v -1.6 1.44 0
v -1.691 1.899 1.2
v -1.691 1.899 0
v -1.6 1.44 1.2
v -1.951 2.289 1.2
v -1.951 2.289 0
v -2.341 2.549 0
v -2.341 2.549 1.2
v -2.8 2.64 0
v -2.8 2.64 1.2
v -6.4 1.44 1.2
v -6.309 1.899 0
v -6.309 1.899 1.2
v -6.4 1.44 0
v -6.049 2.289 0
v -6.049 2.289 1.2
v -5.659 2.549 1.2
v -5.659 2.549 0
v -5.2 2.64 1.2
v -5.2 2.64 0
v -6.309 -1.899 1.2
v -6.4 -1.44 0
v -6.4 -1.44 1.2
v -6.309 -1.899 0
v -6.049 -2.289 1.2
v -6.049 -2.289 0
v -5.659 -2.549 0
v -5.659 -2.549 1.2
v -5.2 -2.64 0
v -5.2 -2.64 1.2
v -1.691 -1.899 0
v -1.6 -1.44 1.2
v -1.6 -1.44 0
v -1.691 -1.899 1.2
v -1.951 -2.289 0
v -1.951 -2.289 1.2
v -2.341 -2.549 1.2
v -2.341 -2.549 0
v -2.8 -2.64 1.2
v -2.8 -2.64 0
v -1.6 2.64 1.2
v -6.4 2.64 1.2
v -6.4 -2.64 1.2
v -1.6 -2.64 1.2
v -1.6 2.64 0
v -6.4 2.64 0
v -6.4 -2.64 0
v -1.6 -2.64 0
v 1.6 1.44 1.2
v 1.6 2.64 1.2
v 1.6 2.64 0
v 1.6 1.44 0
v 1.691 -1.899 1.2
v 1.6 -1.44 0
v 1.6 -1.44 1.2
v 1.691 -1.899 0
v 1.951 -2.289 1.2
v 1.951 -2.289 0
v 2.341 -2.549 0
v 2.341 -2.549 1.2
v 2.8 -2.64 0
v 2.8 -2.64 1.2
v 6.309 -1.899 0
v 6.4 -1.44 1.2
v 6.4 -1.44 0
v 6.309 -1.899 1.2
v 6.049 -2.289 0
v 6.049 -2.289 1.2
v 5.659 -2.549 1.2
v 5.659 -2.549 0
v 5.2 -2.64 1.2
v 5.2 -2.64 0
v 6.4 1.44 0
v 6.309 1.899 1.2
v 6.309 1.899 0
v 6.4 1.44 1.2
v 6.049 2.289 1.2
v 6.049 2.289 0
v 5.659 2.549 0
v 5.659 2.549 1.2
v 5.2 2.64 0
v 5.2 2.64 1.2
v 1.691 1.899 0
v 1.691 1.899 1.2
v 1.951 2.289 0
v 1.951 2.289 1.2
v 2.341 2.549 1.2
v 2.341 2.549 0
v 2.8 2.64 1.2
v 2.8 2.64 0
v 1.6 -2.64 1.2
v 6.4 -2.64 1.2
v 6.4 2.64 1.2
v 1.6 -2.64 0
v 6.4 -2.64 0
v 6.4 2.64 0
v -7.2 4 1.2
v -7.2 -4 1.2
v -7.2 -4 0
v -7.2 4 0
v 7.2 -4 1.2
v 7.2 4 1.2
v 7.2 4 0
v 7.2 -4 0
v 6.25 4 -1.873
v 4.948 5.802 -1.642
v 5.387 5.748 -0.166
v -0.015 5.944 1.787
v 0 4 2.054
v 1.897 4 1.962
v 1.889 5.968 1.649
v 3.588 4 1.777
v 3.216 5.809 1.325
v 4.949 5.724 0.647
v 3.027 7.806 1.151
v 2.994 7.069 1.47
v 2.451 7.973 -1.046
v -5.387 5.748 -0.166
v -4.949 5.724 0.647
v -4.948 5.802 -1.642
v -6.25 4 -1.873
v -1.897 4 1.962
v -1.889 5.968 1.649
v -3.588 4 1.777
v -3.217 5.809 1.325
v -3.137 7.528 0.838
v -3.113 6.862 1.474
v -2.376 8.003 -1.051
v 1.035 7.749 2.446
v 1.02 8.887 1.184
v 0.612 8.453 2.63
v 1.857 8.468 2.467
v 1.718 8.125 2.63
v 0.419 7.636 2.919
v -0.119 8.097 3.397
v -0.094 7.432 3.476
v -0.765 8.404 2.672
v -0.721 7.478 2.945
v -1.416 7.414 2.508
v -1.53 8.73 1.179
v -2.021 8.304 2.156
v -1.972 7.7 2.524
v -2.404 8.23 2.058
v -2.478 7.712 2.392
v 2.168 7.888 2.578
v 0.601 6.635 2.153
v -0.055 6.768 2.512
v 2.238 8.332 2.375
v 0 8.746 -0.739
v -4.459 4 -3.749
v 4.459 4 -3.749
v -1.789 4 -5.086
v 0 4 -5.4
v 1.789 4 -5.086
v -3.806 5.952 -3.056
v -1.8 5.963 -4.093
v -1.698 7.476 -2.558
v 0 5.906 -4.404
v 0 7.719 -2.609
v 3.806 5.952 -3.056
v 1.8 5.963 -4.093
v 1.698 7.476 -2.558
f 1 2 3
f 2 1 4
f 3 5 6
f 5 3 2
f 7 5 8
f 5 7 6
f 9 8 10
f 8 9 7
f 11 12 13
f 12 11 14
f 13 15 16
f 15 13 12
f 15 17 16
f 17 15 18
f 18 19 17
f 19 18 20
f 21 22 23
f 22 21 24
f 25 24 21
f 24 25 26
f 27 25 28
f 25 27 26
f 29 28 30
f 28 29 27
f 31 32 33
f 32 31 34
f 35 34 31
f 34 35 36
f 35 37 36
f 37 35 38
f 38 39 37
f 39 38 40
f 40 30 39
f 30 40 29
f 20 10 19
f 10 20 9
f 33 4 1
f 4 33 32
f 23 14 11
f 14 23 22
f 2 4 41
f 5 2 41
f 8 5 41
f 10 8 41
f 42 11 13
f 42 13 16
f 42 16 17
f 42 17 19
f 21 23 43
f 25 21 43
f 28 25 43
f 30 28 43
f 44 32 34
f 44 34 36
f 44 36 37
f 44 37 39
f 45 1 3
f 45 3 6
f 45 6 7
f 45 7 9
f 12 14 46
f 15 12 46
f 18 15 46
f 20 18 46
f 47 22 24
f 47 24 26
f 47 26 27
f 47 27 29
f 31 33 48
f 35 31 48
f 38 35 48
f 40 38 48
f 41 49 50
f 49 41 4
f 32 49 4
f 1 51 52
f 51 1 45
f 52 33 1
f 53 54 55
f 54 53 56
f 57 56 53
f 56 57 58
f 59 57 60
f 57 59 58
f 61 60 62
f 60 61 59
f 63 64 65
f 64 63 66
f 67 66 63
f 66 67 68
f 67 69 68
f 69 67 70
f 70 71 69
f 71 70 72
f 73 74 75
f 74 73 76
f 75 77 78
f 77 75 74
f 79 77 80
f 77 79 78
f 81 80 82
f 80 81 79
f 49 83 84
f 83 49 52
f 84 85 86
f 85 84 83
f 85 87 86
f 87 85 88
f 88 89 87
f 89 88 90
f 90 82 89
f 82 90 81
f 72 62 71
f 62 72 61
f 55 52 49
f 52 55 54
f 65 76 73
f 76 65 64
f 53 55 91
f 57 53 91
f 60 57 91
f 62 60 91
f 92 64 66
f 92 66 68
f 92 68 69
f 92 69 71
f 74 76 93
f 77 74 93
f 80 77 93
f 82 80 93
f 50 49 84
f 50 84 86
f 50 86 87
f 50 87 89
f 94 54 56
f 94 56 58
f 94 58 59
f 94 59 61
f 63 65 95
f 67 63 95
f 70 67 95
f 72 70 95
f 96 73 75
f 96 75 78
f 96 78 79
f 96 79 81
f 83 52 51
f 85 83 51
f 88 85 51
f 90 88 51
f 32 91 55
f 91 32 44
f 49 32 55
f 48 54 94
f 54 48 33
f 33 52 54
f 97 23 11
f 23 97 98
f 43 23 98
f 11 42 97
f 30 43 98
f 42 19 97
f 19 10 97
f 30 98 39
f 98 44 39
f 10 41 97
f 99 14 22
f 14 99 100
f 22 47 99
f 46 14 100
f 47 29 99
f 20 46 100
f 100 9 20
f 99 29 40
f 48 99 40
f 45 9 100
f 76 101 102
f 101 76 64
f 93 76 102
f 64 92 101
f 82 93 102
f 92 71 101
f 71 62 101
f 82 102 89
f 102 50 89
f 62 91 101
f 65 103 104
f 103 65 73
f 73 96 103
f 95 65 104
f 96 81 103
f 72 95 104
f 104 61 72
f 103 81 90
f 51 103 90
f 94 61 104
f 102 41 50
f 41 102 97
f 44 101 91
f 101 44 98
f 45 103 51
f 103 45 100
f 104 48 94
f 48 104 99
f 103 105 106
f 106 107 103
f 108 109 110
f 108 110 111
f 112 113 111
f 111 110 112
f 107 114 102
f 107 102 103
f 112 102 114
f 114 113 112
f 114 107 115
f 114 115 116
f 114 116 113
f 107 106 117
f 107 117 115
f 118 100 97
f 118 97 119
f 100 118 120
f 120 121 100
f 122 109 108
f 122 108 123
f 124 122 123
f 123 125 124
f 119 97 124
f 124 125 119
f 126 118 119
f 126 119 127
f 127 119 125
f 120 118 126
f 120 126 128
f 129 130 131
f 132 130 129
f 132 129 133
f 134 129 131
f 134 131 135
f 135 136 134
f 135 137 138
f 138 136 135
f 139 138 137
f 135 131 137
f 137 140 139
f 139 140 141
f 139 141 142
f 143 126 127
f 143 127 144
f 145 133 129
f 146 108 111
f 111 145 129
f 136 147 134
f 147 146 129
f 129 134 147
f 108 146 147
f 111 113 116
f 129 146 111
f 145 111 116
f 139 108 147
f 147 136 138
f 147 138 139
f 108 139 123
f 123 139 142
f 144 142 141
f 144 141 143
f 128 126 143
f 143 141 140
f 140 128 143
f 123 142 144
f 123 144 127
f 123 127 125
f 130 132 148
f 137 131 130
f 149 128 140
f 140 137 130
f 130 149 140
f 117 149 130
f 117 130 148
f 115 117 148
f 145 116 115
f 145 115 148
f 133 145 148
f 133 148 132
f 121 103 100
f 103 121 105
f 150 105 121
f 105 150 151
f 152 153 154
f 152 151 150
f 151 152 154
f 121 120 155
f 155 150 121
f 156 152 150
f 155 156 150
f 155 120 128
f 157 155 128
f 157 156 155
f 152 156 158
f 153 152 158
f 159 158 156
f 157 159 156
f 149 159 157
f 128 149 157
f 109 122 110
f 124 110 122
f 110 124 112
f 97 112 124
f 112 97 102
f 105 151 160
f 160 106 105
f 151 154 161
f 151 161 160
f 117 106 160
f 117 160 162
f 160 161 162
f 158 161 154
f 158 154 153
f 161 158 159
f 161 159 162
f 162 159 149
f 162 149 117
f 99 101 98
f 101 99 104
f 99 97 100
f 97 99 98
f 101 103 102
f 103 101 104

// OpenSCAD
// file: ../p/1-4edge.scad
use <../lib.scad>
function ldraw_lib__1_4edge() = [
// 0 Circle 0.25
// 0 Name: 1-4edge.dat
// 0 Author: James Jessiman
// 0 !LDRAW_ORG Primitive UPDATE 2017-01
// 0 !LICENSE Licensed under CC BY 4.0 : see CAreadme.txt
// 
// 0 BFC CERTIFY CCW
  [0,"BFC","CERTIFY"],
  [0,"BFC","CCW"],
// 
// 0 !HISTORY 2007-06-22 [PTadmin] Header formatted for Contributor Agreement
// 0 !HISTORY 2008-07-01 [PTadmin] Official Update 2008-01
// 0 !HISTORY 2017-01-15 [Steffen] BFCed
// 0 !HISTORY 2017-12-30 [PTadmin] Official Update 2017-01
// 
// 
// 2 24 1 0 0 0.9239 0 0.3827
  [2,24,1,0,0,0.9239,0,0.3827],
// 2 24 0.9239 0 0.3827 0.7071 0 0.7071
  [2,24,0.9239,0,0.3827,0.7071,0,0.7071],
// 2 24 0.7071 0 0.7071 0.3827 0 0.9239
  [2,24,0.7071,0,0.7071,0.3827,0,0.9239],
// 2 24 0.3827 0 0.9239 0 0 1
  [2,24,0.3827,0,0.9239,0,0,1],
];
module ldraw_lib__1_4edge(step=0, col=false, unit=2/5, alt=false, line=0.2, solid=!$preview)
    makepoly(ldraw_lib__1_4edge(), step=step, col=col, unit=unit, alt=alt, line=line, solid=solid);
ldraw_lib__1_4edge(line=0.2);
// file: ../p/1-4cyli.scad
use <../lib.scad>
function ldraw_lib__1_4cyli() = [
// 0 Cylinder 0.25
// 0 Name: 1-4cyli.dat
// 0 Author: James Jessiman
// 0 !LDRAW_ORG Primitive UPDATE 2012-01
// 0 !LICENSE Licensed under CC BY 4.0 : see CAreadme.txt
// 
// 0 BFC CERTIFY CCW
  [0,"BFC","CERTIFY"],
  [0,"BFC","CCW"],
// 
// 0 !HISTORY 2002-03-23 [sbliss] Added BFC statement.
// 0 !HISTORY 2002-04-25 [PTadmin] Official Update 2002-02
// 0 !HISTORY 2007-06-22 [PTadmin] Header formatted for Contributor Agreement
// 0 !HISTORY 2008-07-01 [PTadmin] Official Update 2008-01
// 0 !HISTORY 2012-02-16 [Philo] Changed to CCW
// 0 !HISTORY 2012-03-30 [PTadmin] Official Update 2012-01
// 
// 
// 4 16 1 1 0 0.9239 1 0.3827 0.9239 0 0.3827 1 0 0
  [4,16,1,1,0,0.9239,1,0.3827,0.9239,0,0.3827,1,0,0],
// 5 24 1 0 0 1 1 0 0.9239 0 0.3827 1 0 -1
  [5,24,1,0,0,1,1,0,0.9239,0,0.3827,1,0,-1],
// 4 16 0.9239 1 0.3827 0.7071 1 0.7071 0.7071 0 0.7071 0.9239 0 0.3827
  [4,16,0.9239,1,0.3827,0.7071,1,0.7071,0.7071,0,0.7071,0.9239,0,0.3827],
// 5 24 0.9239 0 0.3827 0.9239 1 0.3827 0.7071 0 0.7071 1 0 0
  [5,24,0.9239,0,0.3827,0.9239,1,0.3827,0.7071,0,0.7071,1,0,0],
// 4 16 0.7071 1 0.7071 0.3827 1 0.9239 0.3827 0 0.9239 0.7071 0 0.7071
  [4,16,0.7071,1,0.7071,0.3827,1,0.9239,0.3827,0,0.9239,0.7071,0,0.7071],
// 5 24 0.7071 0 0.7071 0.7071 1 0.7071 0.3827 0 0.9239 0.9239 0 0.3827
  [5,24,0.7071,0,0.7071,0.7071,1,0.7071,0.3827,0,0.9239,0.9239,0,0.3827],
// 4 16 0.3827 1 0.9239 0 1 1 0 0 1 0.3827 0 0.9239
  [4,16,0.3827,1,0.9239,0,1,1,0,0,1,0.3827,0,0.9239],
// 5 24 0.3827 0 0.9239 0.3827 1 0.9239 0 0 1 0.7071 0 0.7071
  [5,24,0.3827,0,0.9239,0.3827,1,0.9239,0,0,1,0.7071,0,0.7071],
// 5 24 0 0 1 0 1 1 0.3827 0 0.9239 -1 0 1
  [5,24,0,0,1,0,1,1,0.3827,0,0.9239,-1,0,1],
];
module ldraw_lib__1_4cyli(step=0, col=false, unit=2/5, alt=false, line=0.2, solid=!$preview)
    makepoly(ldraw_lib__1_4cyli(), step=step, col=col, unit=unit, alt=alt, line=line, solid=solid);
ldraw_lib__1_4cyli(line=0.2);
// file: ../p/rect2p.scad
use <../lib.scad>
function ldraw_lib__rect2p() = [
// 0 Rectangle with 2 Parallel Edges
// 0 Name: rect2p.dat
// 0 Author: Donald Sutter [technog]
// 0 !LDRAW_ORG Primitive UPDATE 2010-01
// 0 !LICENSE Licensed under CC BY 4.0 : see CAreadme.txt
// 
// 0 BFC CERTIFY CCW
  [0,"BFC","CERTIFY"],
  [0,"BFC","CCW"],
// 
// 0 !HISTORY 2003-08-01 [PTadmin] Official Update 2003-02
// 0 !HISTORY 2007-06-24 [PTadmin] Header formatted for Contributor Agreement
// 0 !HISTORY 2008-07-01 [PTadmin] Official Update 2008-01
// 0 !HISTORY 2010-01-17 [mikeheide] changed winding to CCW
// 0 !HISTORY 2010-04-05 [PTadmin] Official Update 2010-01
// 
// 
// 2 24 1 0 1 -1 0 1
  [2,24,1,0,1,-1,0,1],
// 2 24 -1 0 -1 1 0 -1
  [2,24,-1,0,-1,1,0,-1],
// 4 16 -1 0 1 -1 0 -1 1 0 -1 1 0 1
  [4,16,-1,0,1,-1,0,-1,1,0,-1,1,0,1],
// 0
];
module ldraw_lib__rect2p(step=0, col=false, unit=2/5, alt=false, line=0.2, solid=!$preview)
    makepoly(ldraw_lib__rect2p(), step=step, col=col, unit=unit, alt=alt, line=line, solid=solid);
ldraw_lib__rect2p(line=0.2);
// file: ../p/1-4ndis.scad
use <../lib.scad>
function ldraw_lib__1_4ndis() = [
// 0 Disc Negative 0.25
// 0 Name: 1-4ndis.dat
// 0 Author: James Jessiman
// 0 !LDRAW_ORG Primitive UPDATE 2012-01
// 0 !LICENSE Licensed under CC BY 4.0 : see CAreadme.txt
// 
// 0 BFC CERTIFY CCW
  [0,"BFC","CERTIFY"],
  [0,"BFC","CCW"],
// 
// 0 !HISTORY 2002-03-23 [sbliss] Added BFC Statement
// 0 !HISTORY 2002-04-25 [PTadmin] Official Update 2002-02
// 0 !HISTORY 2007-06-22 [PTadmin] Header formatted for Contributor Agreement
// 0 !HISTORY 2008-07-01 [PTadmin] Official Update 2008-01
// 0 !HISTORY 2012-02-16 [Philo] Changed to CCW
// 0 !HISTORY 2012-03-30 [PTadmin] Official Update 2012-01
// 
// 
// 3 16 0.9239 0 0.3827 1 0 0 1 0 1
  [3,16,0.9239,0,0.3827,1,0,0,1,0,1],
// 3 16 0.7071 0 0.7071 0.9239 0 0.3827 1 0 1
  [3,16,0.7071,0,0.7071,0.9239,0,0.3827,1,0,1],
// 3 16 0.3827 0 0.9239 0.7071 0 0.7071 1 0 1
  [3,16,0.3827,0,0.9239,0.7071,0,0.7071,1,0,1],
// 3 16 0 0 1 0.3827 0 0.9239 1 0 1
  [3,16,0,0,1,0.3827,0,0.9239,1,0,1],
];
module ldraw_lib__1_4ndis(step=0, col=false, unit=2/5, alt=false, line=0.2, solid=!$preview)
    makepoly(ldraw_lib__1_4ndis(), step=step, col=col, unit=unit, alt=alt, line=line, solid=solid);
ldraw_lib__1_4ndis(line=0.2);
// file: ../p/1-4cylo.scad
use <../lib.scad>
use <1-4cyli.scad>
use <1-4edge.scad>
function ldraw_lib__1_4cylo() = [
// 0 Cylinder Open 0.25
// 0 Name: 1-4cylo.dat
// 0 Author: Max Martin Richter [MMR1988]
// 0 !LDRAW_ORG Primitive UPDATE 2010-03
// 0 !LICENSE Licensed under CC BY 4.0 : see CAreadme.txt
// 
// 0 BFC CERTIFY CCW
  [0,"BFC","CERTIFY"],
  [0,"BFC","CCW"],
// 
// 0 !HISTORY 2010-12-31 [PTadmin] Official Update 2010-03
// 
// 
// 1 16 0 0 0 1 0 0 0 1 0 0 0 1 1-4edge.dat
  [1,16,0,0,0,1,0,0,0,1,0,0,0,1, ldraw_lib__1_4edge()],
// 1 16 0 1 0 1 0 0 0 1 0 0 0 1 1-4edge.dat
  [1,16,0,1,0,1,0,0,0,1,0,0,0,1, ldraw_lib__1_4edge()],
// 1 16 0 0 0 1 0 0 0 1 0 0 0 1 1-4cyli.dat
  [1,16,0,0,0,1,0,0,0,1,0,0,0,1, ldraw_lib__1_4cyli()],
];
module ldraw_lib__1_4cylo(step=0, col=false, unit=2/5, alt=false, line=0.2, solid=!$preview)
    makepoly(ldraw_lib__1_4cylo(), step=step, col=col, unit=unit, alt=alt, line=line, solid=solid);
ldraw_lib__1_4cylo(line=0.2);
// file: s/24779s03.scad
use <../../lib.scad>
use <../../p/1-4cylo.scad>
use <../../p/1-4ndis.scad>
use <../../p/rect2p.scad>
function ldraw_lib__s__24779s03() = [
// 0 ~Minifig Hipwear Antistud
// 0 Name: s\24779s03.dat
// 0 Author: Gerald Lasser [GeraldLasser]
// 0 !LDRAW_ORG Subpart UPDATE 2022-03
// 0 !LICENSE Licensed under CC BY 4.0 : see CAreadme.txt
// 
// 0 BFC CERTIFY CCW
  [0,"BFC","CERTIFY"],
  [0,"BFC","CCW"],
// 
// 0 !HISTORY 2022-05-07 [PTadmin] Official Update 2022-03
// 
// 
// 0 BFC INVERTNEXT
  [0,"BFC","INVERTNEXT"],
// 1 16 -7 -3 3.6 3 0 0 0 3 0 0 0 3 1-4cylo.dat
  [1,16,-7,-3,3.6,3,0,0,0,3,0,0,0,3, ldraw_lib__1_4cylo()],
// 0 BFC INVERTNEXT
  [0,"BFC","INVERTNEXT"],
// 1 16 -13 -3 3.6 -3 0 0 0 3 0 0 0 3 1-4cylo.dat
  [1,16,-13,-3,3.6,-3,0,0,0,3,0,0,0,3, ldraw_lib__1_4cylo()],
// 0 BFC INVERTNEXT
  [0,"BFC","INVERTNEXT"],
// 1 16 -13 -3 -3.6 -3 0 0 0 3 0 0 0 -3 1-4cylo.dat
  [1,16,-13,-3,-3.6,-3,0,0,0,3,0,0,0,-3, ldraw_lib__1_4cylo()],
// 0 BFC INVERTNEXT
  [0,"BFC","INVERTNEXT"],
// 1 16 -7 -3 -3.6 3 0 0 0 3 0 0 0 -3 1-4cylo.dat
  [1,16,-7,-3,-3.6,3,0,0,0,3,0,0,0,-3, ldraw_lib__1_4cylo()],
// 1 16 -10 -1.5 -6.6 3 0 0 0 0 -1.5 0 -1 0 rect2p.dat
  [1,16,-10,-1.5,-6.6,3,0,0,0,0,-1.5,0,-1,0, ldraw_lib__rect2p()],
// 1 16 -10 -1.5 6.6 3 0 0 0 0 -1.5 0 1 0 rect2p.dat
  [1,16,-10,-1.5,6.6,3,0,0,0,0,-1.5,0,1,0, ldraw_lib__rect2p()],
// 1 16 -4 -1.5 0 0 1 0 0 0 -1.5 -3.6 0 0 rect2p.dat
  [1,16,-4,-1.5,0,0,1,0,0,0,-1.5,-3.6,0,0, ldraw_lib__rect2p()],
// 1 16 -16 -1.5 0 0 -1 0 0 0 -1.5 -3.6 0 0 rect2p.dat
  [1,16,-16,-1.5,0,0,-1,0,0,0,-1.5,-3.6,0,0, ldraw_lib__rect2p()],
// 1 16 -7 -3 3.6 3 0 0 0 1 0 0 0 3 1-4ndis.dat
  [1,16,-7,-3,3.6,3,0,0,0,1,0,0,0,3, ldraw_lib__1_4ndis()],
// 1 16 -13 -3 3.6 -3 0 0 0 1 0 0 0 3 1-4ndis.dat
  [1,16,-13,-3,3.6,-3,0,0,0,1,0,0,0,3, ldraw_lib__1_4ndis()],
// 1 16 -13 -3 -3.6 -3 0 0 0 1 0 0 0 -3 1-4ndis.dat
  [1,16,-13,-3,-3.6,-3,0,0,0,1,0,0,0,-3, ldraw_lib__1_4ndis()],
// 1 16 -7 -3 -3.6 3 0 0 0 1 0 0 0 -3 1-4ndis.dat
  [1,16,-7,-3,-3.6,3,0,0,0,1,0,0,0,-3, ldraw_lib__1_4ndis()],
// 1 16 -7 0 3.6 3 0 0 0 -1 0 0 0 3 1-4ndis.dat
  [1,16,-7,0,3.6,3,0,0,0,-1,0,0,0,3, ldraw_lib__1_4ndis()],
// 1 16 -13 0 3.6 -3 0 0 0 -1 0 0 0 3 1-4ndis.dat
  [1,16,-13,0,3.6,-3,0,0,0,-1,0,0,0,3, ldraw_lib__1_4ndis()],
// 1 16 -13 0 -3.6 -3 0 0 0 -1 0 0 0 -3 1-4ndis.dat
  [1,16,-13,0,-3.6,-3,0,0,0,-1,0,0,0,-3, ldraw_lib__1_4ndis()],
// 1 16 -7 0 -3.6 3 0 0 0 -1 0 0 0 -3 1-4ndis.dat
  [1,16,-7,0,-3.6,3,0,0,0,-1,0,0,0,-3, ldraw_lib__1_4ndis()],
// 
// 4 16 4 -3 6.6 -4 -3 6.6 -4 -3 3.6 4 -3 3.6
  [4,16,4,-3,6.6,-4,-3,6.6,-4,-3,3.6,4,-3,3.6],
// 3 16 -4 -3 -3.6 4 -3 3.6 -4 -3 3.6
  [3,16,-4,-3,-3.6,4,-3,3.6,-4,-3,3.6],
// 4 16 -4 0 3.6 -4 0 6.6 4 0 6.6 4 0 3.6
  [4,16,-4,0,3.6,-4,0,6.6,4,0,6.6,4,0,3.6],
// 3 16 4 0 3.6 -4 0 -3.6 -4 0 3.6
  [3,16,4,0,3.6,-4,0,-3.6,-4,0,3.6],
];
module ldraw_lib__s__24779s03(step=0, col=false, unit=2/5, alt=false, line=0.2, solid=!$preview)
    makepoly(ldraw_lib__s__24779s03(), step=step, col=col, unit=unit, alt=alt, line=line, solid=solid);
ldraw_lib__s__24779s03(line=0.2);
// file: s/24779s02.scad
use <../../lib.scad>
use <24779s03.scad>
function ldraw_lib__s__24779s02() = [
// 0 ~Minifig Hipwear Antistuds Common Geometry without Sides
// 0 Name: s\24779s02.dat
// 0 Author: Gerald Lasser [GeraldLasser]
// 0 !LDRAW_ORG Subpart UPDATE 2022-04
// 0 !LICENSE Licensed under CC BY 4.0 : see CAreadme.txt
// 
// 0 BFC CERTIFY CCW
  [0,"BFC","CERTIFY"],
  [0,"BFC","CCW"],
// 
// 0 !HISTORY 2022-03-10 [MagFors] corrected hip width
// 0 !HISTORY 2022-07-18 [PTadmin] Official Update 2022-04
// 
// 
// 1 16 0 0 0 1 0 0 0 1 0 0 0 1 s\24779s03.dat
  [1,16,0,0,0,1,0,0,0,1,0,0,0,1, ldraw_lib__s__24779s03()],
// 1 16 0 0 0 -1 0 0 0 1 0 0 0 -1 s\24779s03.dat
  [1,16,0,0,0,-1,0,0,0,1,0,0,0,-1, ldraw_lib__s__24779s03()],
// 
// 4 16 -18 -3 10 -18 -3 -10 -16 -3 -3.6 -16 -3 3.6
  [4,16,-18,-3,10,-18,-3,-10,-16,-3,-3.6,-16,-3,3.6],
// 3 16 -16 -3 -6.6 -16 -3 -3.6 -18 -3 -10
  [3,16,-16,-3,-6.6,-16,-3,-3.6,-18,-3,-10],
// 3 16 -16 -3 3.6 -16 -3 6.6 -18 -3 10
  [3,16,-16,-3,3.6,-16,-3,6.6,-18,-3,10],
// 3 16 -13 -3 -6.6 -16 -3 -6.6 -18 -3 -10
  [3,16,-13,-3,-6.6,-16,-3,-6.6,-18,-3,-10],
// 3 16 -16 -3 6.6 -13 -3 6.6 -18 -3 10
  [3,16,-16,-3,6.6,-13,-3,6.6,-18,-3,10],
// 3 16 -13 -3 6.6 -7 -3 6.6 -18 -3 10
  [3,16,-13,-3,6.6,-7,-3,6.6,-18,-3,10],
// 3 16 -13 -3 -6.6 -18 -3 -10 -7 -3 -6.6
  [3,16,-13,-3,-6.6,-18,-3,-10,-7,-3,-6.6],
// 3 16 -18 -3 -10 -4 -3 -6.6 -7 -3 -6.6
  [3,16,-18,-3,-10,-4,-3,-6.6,-7,-3,-6.6],
// 3 16 -7 -3 6.6 -4 -3 6.6 -18 -3 10
  [3,16,-7,-3,6.6,-4,-3,6.6,-18,-3,10],
// 4 16 -16 0 -3.6 -18 0 -10 -18 0 10 -16 0 3.6
  [4,16,-16,0,-3.6,-18,0,-10,-18,0,10,-16,0,3.6],
// 3 16 -16 0 -3.6 -16 0 -6.6 -18 0 -10
  [3,16,-16,0,-3.6,-16,0,-6.6,-18,0,-10],
// 3 16 -16 0 6.6 -16 0 3.6 -18 0 10
  [3,16,-16,0,6.6,-16,0,3.6,-18,0,10],
// 3 16 -16 0 -6.6 -13 0 -6.6 -18 0 -10
  [3,16,-16,0,-6.6,-13,0,-6.6,-18,0,-10],
// 3 16 -13 0 6.6 -16 0 6.6 -18 0 10
  [3,16,-13,0,6.6,-16,0,6.6,-18,0,10],
// 3 16 -18 0 10 -7 0 6.6 -13 0 6.6
  [3,16,-18,0,10,-7,0,6.6,-13,0,6.6],
// 3 16 -18 0 -10 -13 0 -6.6 -7 0 -6.6
  [3,16,-18,0,-10,-13,0,-6.6,-7,0,-6.6],
// 3 16 -4 0 -6.6 -18 0 -10 -7 0 -6.6
  [3,16,-4,0,-6.6,-18,0,-10,-7,0,-6.6],
// 3 16 -4 0 6.6 -7 0 6.6 -18 0 10
  [3,16,-4,0,6.6,-7,0,6.6,-18,0,10],
// 
// 4 16 18 -3 -10 18 -3 10 16 -3 3.6 16 -3 -3.6
  [4,16,18,-3,-10,18,-3,10,16,-3,3.6,16,-3,-3.6],
// 3 16 16 -3 6.6 16 -3 3.6 18 -3 10
  [3,16,16,-3,6.6,16,-3,3.6,18,-3,10],
// 3 16 16 -3 -3.6 16 -3 -6.6 18 -3 -10
  [3,16,16,-3,-3.6,16,-3,-6.6,18,-3,-10],
// 3 16 13 -3 6.6 16 -3 6.6 18 -3 10
  [3,16,13,-3,6.6,16,-3,6.6,18,-3,10],
// 3 16 16 -3 -6.6 13 -3 -6.6 18 -3 -10
  [3,16,16,-3,-6.6,13,-3,-6.6,18,-3,-10],
// 3 16 13 -3 -6.6 7 -3 -6.6 18 -3 -10
  [3,16,13,-3,-6.6,7,-3,-6.6,18,-3,-10],
// 3 16 13 -3 6.6 18 -3 10 7 -3 6.6
  [3,16,13,-3,6.6,18,-3,10,7,-3,6.6],
// 3 16 18 -3 10 4 -3 6.6 7 -3 6.6
  [3,16,18,-3,10,4,-3,6.6,7,-3,6.6],
// 3 16 7 -3 -6.6 4 -3 -6.6 18 -3 -10
  [3,16,7,-3,-6.6,4,-3,-6.6,18,-3,-10],
// 4 16 16 0 3.6 18 0 10 18 0 -10 16 0 -3.6
  [4,16,16,0,3.6,18,0,10,18,0,-10,16,0,-3.6],
// 3 16 16 0 3.6 16 0 6.6 18 0 10
  [3,16,16,0,3.6,16,0,6.6,18,0,10],
// 3 16 16 0 -6.6 16 0 -3.6 18 0 -10
  [3,16,16,0,-6.6,16,0,-3.6,18,0,-10],
// 3 16 16 0 6.6 13 0 6.6 18 0 10
  [3,16,16,0,6.6,13,0,6.6,18,0,10],
// 3 16 13 0 -6.6 16 0 -6.6 18 0 -10
  [3,16,13,0,-6.6,16,0,-6.6,18,0,-10],
// 3 16 18 0 -10 7 0 -6.6 13 0 -6.6
  [3,16,18,0,-10,7,0,-6.6,13,0,-6.6],
// 3 16 18 0 10 13 0 6.6 7 0 6.6
  [3,16,18,0,10,13,0,6.6,7,0,6.6],
// 3 16 4 0 6.6 18 0 10 7 0 6.6
  [3,16,4,0,6.6,18,0,10,7,0,6.6],
// 3 16 4 0 -6.6 7 0 -6.6 18 0 -10
  [3,16,4,0,-6.6,7,0,-6.6,18,0,-10],
// 
// 4 16 4 -3 6.6 18 -3 10 -18 -3 10 -4 -3 6.6
  [4,16,4,-3,6.6,18,-3,10,-18,-3,10,-4,-3,6.6],
// 4 16 18 -3 -10 4 -3 -6.6 -4 -3 -6.6 -18 -3 -10
  [4,16,18,-3,-10,4,-3,-6.6,-4,-3,-6.6,-18,-3,-10],
// 4 16 -18 0 10 18 0 10 4 0 6.6 -4 0 6.6
  [4,16,-18,0,10,18,0,10,4,0,6.6,-4,0,6.6],
// 4 16 -4 0 -6.6 4 0 -6.6 18 0 -10 -18 0 -10
  [4,16,-4,0,-6.6,4,0,-6.6,18,0,-10,-18,0,-10],
];
module ldraw_lib__s__24779s02(step=0, col=false, unit=2/5, alt=false, line=0.2, solid=!$preview)
    makepoly(ldraw_lib__s__24779s02(), step=step, col=col, unit=unit, alt=alt, line=line, solid=solid);
ldraw_lib__s__24779s02(line=0.2);
// file: ../p/box3u2p.scad
use <../lib.scad>
function ldraw_lib__box3u2p() = [
// 0 Box with 3 Faces without 2 Parallel Edges
// 0 Name: box3u2p.dat
// 0 Author: Niels Karsdorp [nielsk]
// 0 !LDRAW_ORG Primitive UPDATE 2012-01
// 0 !LICENSE Licensed under CC BY 4.0 : see CAreadme.txt
// 
// 0 BFC CERTIFY CCW
  [0,"BFC","CERTIFY"],
  [0,"BFC","CCW"],
// 
// 0 !HISTORY 2003-03-12 [PTadmin] Official Update 2003-01
// 0 !HISTORY 2007-06-24 [PTadmin] Header formatted for Contributor Agreement
// 0 !HISTORY 2008-07-01 [PTadmin] Official Update 2008-01
// 0 !HISTORY 2012-02-16 [Philo] Changed to CCW
// 0 !HISTORY 2012-03-30 [PTadmin] Official Update 2012-01
// 
// 
// 2 24 1 1 1 -1 1 1
  [2,24,1,1,1,-1,1,1],
// 2 24 -1 1 -1 1 1 -1
  [2,24,-1,1,-1,1,1,-1],
// 2 24 1 0 1 -1 0 1
  [2,24,1,0,1,-1,0,1],
// 2 24 -1 0 -1 1 0 -1
  [2,24,-1,0,-1,1,0,-1],
// 2 24 1 1 1 1 1 -1
  [2,24,1,1,1,1,1,-1],
// 2 24 -1 1 1 -1 1 -1
  [2,24,-1,1,1,-1,1,-1],
// 2 24 1 1 1 1 0 1
  [2,24,1,1,1,1,0,1],
// 2 24 1 1 -1 1 0 -1
  [2,24,1,1,-1,1,0,-1],
// 2 24 -1 1 1 -1 0 1
  [2,24,-1,1,1,-1,0,1],
// 2 24 -1 1 -1 -1 0 -1
  [2,24,-1,1,-1,-1,0,-1],
// 4 16 -1 1 -1 -1 1 1 1 1 1 1 1 -1
  [4,16,-1,1,-1,-1,1,1,1,1,1,1,1,-1],
// 4 16 -1 1 1 -1 0 1 1 0 1 1 1 1
  [4,16,-1,1,1,-1,0,1,1,0,1,1,1,1],
// 4 16 1 1 -1 1 0 -1 -1 0 -1 -1 1 -1
  [4,16,1,1,-1,1,0,-1,-1,0,-1,-1,1,-1],
];
module ldraw_lib__box3u2p(step=0, col=false, unit=2/5, alt=false, line=0.2, solid=!$preview)
    makepoly(ldraw_lib__box3u2p(), step=step, col=col, unit=unit, alt=alt, line=line, solid=solid);
ldraw_lib__box3u2p(line=0.2);
// main file
use <../lib.scad>
use <../p/box3u2p.scad>
use <s/24779s01.scad>
function ldraw_lib__24779pk0() = [
// 0 Minifig Tail Duck with Blue Hip Pattern
// 0 Name: 24779pk0.dat
// 0 Author: Gerald Lasser [GeraldLasser]
// 0 !LDRAW_ORG Part UPDATE 2022-04
// 0 !LICENSE Licensed under CC BY 4.0 : see CAreadme.txt
// 
// 0 BFC CERTIFY CCW
  [0,"BFC","CERTIFY"],
  [0,"BFC","CCW"],
// 
// 0 !CATEGORY Minifig Hipwear
// 0 !KEYWORDS Bricklink 24779pb01, Collectible, Disney, Rebrickable 24779pr0009
// 0 !KEYWORDS Scrooge McDuck, set 71024
// 
// 0 !HISTORY 2022-03-10 [MagFors] corrected hip width
// 0 !HISTORY 2022-07-18 [PTadmin] Official Update 2022-04
// 
// 
// 1 16 0 0 0 1 0 0 0 1 0 0 0 1 s\24779s01.dat
  [1,16,0,0,0,1,0,0,0,1,0,0,0,1, ldraw_lib__s__24779s01()],
// 1 1 0 -1.5 10 0 0 -18 1.5 0 0 0 -20 0 box3u2p.dat
  [1,1,0,-1.5,10,0,0,-18,1.5,0,0,0,-20,0, ldraw_lib__box3u2p()],
];
module ldraw_lib__24779pk0(step=0, col=false, unit=2/5, alt=false, line=0.2, solid=!$preview)
    makepoly(ldraw_lib__24779pk0(), step=step, col=col, unit=unit, alt=alt, line=line, solid=solid);
ldraw_lib__24779pk0(line=0.2);
